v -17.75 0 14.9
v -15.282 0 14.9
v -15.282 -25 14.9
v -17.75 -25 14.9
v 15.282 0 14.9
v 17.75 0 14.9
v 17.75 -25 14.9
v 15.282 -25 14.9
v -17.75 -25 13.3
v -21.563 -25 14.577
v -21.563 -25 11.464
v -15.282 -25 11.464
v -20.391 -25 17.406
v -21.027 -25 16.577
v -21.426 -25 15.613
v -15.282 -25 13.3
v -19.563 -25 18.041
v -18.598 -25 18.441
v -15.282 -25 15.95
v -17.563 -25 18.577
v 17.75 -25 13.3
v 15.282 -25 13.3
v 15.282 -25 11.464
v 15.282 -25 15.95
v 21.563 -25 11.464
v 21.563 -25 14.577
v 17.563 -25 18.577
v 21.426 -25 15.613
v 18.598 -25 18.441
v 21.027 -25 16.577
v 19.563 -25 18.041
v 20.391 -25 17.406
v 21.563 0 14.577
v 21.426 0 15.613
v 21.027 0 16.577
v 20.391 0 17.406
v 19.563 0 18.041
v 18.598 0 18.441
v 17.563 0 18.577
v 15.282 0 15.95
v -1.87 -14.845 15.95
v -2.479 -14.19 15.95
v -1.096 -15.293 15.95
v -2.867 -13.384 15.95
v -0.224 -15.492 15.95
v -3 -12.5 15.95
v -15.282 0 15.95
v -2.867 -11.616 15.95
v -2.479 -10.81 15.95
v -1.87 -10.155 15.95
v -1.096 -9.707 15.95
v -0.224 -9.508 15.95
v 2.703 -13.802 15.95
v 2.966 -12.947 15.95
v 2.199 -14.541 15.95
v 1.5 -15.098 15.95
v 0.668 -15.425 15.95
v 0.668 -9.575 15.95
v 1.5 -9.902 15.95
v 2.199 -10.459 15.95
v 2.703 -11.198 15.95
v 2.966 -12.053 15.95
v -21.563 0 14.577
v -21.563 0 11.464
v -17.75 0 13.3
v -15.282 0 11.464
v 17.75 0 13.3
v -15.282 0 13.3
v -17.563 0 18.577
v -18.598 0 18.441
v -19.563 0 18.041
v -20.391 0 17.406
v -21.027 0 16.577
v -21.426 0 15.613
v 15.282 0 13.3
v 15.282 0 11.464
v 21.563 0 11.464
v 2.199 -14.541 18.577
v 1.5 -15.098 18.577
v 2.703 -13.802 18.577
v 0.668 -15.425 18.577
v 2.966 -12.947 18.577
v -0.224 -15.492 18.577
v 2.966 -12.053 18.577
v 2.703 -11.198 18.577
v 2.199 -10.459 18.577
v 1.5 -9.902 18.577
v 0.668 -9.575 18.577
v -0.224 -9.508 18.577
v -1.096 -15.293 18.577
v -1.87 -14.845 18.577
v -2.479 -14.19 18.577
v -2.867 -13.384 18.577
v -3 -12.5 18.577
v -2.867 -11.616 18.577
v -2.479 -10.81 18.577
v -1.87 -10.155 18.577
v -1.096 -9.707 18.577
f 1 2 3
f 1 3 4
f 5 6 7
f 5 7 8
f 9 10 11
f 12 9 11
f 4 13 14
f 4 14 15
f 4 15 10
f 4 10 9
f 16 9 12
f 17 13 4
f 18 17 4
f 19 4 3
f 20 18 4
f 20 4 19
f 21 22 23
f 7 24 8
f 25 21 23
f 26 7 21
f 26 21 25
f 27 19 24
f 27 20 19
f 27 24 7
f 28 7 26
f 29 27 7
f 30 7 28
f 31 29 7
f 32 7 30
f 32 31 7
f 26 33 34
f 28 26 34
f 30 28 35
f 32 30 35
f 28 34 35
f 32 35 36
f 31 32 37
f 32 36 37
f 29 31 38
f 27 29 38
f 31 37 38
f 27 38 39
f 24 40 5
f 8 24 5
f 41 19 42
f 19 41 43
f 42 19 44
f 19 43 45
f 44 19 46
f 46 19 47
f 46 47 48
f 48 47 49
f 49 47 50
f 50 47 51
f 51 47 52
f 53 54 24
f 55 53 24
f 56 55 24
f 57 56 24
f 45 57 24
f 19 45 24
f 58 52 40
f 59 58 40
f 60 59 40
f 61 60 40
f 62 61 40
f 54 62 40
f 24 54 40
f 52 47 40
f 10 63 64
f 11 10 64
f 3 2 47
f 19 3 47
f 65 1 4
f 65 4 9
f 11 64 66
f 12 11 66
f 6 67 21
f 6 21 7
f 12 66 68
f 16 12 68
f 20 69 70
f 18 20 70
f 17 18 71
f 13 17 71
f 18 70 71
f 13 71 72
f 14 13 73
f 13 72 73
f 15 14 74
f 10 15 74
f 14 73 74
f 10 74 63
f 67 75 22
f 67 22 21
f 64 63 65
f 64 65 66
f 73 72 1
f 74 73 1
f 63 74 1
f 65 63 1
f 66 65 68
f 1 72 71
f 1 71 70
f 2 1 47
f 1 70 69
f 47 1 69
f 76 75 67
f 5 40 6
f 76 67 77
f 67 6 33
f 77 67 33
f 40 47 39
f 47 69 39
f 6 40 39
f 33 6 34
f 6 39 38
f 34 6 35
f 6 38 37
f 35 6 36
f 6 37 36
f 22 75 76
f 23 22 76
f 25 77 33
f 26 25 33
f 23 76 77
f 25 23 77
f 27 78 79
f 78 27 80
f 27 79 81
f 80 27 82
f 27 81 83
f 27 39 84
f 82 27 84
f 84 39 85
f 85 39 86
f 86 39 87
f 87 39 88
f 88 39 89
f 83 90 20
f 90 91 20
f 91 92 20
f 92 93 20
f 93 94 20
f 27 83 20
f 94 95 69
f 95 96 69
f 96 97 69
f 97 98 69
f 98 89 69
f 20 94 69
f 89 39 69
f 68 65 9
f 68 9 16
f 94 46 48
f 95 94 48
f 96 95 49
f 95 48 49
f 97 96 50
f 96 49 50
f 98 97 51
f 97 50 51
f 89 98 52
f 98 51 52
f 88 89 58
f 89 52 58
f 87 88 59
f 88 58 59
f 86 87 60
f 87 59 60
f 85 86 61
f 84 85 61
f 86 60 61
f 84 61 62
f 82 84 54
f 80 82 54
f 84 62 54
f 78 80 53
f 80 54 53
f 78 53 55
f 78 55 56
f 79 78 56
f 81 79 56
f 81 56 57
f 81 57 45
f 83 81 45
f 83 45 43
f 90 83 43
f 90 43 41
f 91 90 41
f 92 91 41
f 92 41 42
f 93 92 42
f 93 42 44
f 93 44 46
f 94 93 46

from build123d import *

# Parameters (mm, degrees)
F1_DEPTH = 50
F3_DEPTH = 25
F6_D     = 6


with BuildPart() as f1:
    # F0 (on Front) → F1 (new body)
    with BuildSketch(Plane.XZ):
        with BuildLine():
            Line((-17.75, 14.9), (-17.75, 13.3))
            Line((-17.75, 13.3), (-14.55, 13.3))
            ThreePointArc((-14.55, 13.3), (-13.913604, 13.036396), (-13.65, 12.4))
            Line((-13.65, 12.4), (-13.65, 0.9))
            ThreePointArc((-13.65, 0.9), (-13.386396, 0.263604), (-12.75, 0))
            Line((-12.75, 0), (0, 0))
            Line((0, 0), (12.75, 0))
            ThreePointArc((12.75, 0), (13.386396, 0.263604), (13.65, 0.9))
            Line((13.65, 0.9), (13.65, 12.4))
            ThreePointArc((13.65, 12.4), (13.913604, 13.036396), (14.55, 13.3))
            Line((14.55, 13.3), (17.75, 13.3))
            Line((17.75, 13.3), (17.75, 14.9))
            Line((17.75, 14.9), (13.25, 14.9))
            ThreePointArc((13.25, 14.9), (12.401472, 14.548528), (12.05, 13.7))
            Line((12.05, 13.7), (12.05, 2.5))
            ThreePointArc((12.05, 2.5), (11.786396, 1.863604), (11.15, 1.6))
            Line((11.15, 1.6), (0, 1.6))
            Line((0, 1.6), (-11.15, 1.6))
            ThreePointArc((-11.15, 1.6), (-11.786396, 1.863604), (-12.05, 2.5))
            Line((-12.05, 2.5), (-12.05, 13.7))
            ThreePointArc((-12.05, 13.7), (-12.401472, 14.548528), (-13.25, 14.9))
            Line((-13.25, 14.9), (-17.75, 14.9))
        make_face()
    extrude(amount=F1_DEPTH)


with BuildPart() as f3:
    # F2 (on Front) → F3 (new body)
    with BuildSketch(Plane.XZ):
        with BuildLine():
            Line((-21.562627, 11.464062), (-15.28198, 11.464062))
            Line((-15.28198, 11.464062), (-15.28198, 15.950238))
            Line((-15.28198, 15.950238), (0, 15.950238))
            Line((0, 15.950238), (15.28198, 15.950238))
            Line((15.28198, 15.950238), (15.28198, 11.464062))
            Line((15.28198, 11.464062), (21.562627, 11.464062))
            Line((21.562627, 11.464062), (21.562627, 14.577311))
            ThreePointArc((21.562627, 14.577311), (20.391054, 17.405738), (17.562627, 18.577311))
            Line((17.562627, 18.577311), (0, 18.577311))
            Line((0, 18.577311), (-17.562627, 18.577311))
            ThreePointArc((-17.562627, 18.577311), (-20.391054, 17.405738), (-21.562627, 14.577311))
            Line((-21.562627, 14.577311), (-21.562627, 11.464062))
        make_face()
    extrude(amount=F3_DEPTH)

    # F4: cut F1
    add(f1.part, mode=Mode.SUBTRACT)

    # F6 (through all)
    with Locations(Plane.XY.offset(18.577311)):
        with Locations((0, -12.5)):
            Hole(F6_D / 2)


solid = f3.part
